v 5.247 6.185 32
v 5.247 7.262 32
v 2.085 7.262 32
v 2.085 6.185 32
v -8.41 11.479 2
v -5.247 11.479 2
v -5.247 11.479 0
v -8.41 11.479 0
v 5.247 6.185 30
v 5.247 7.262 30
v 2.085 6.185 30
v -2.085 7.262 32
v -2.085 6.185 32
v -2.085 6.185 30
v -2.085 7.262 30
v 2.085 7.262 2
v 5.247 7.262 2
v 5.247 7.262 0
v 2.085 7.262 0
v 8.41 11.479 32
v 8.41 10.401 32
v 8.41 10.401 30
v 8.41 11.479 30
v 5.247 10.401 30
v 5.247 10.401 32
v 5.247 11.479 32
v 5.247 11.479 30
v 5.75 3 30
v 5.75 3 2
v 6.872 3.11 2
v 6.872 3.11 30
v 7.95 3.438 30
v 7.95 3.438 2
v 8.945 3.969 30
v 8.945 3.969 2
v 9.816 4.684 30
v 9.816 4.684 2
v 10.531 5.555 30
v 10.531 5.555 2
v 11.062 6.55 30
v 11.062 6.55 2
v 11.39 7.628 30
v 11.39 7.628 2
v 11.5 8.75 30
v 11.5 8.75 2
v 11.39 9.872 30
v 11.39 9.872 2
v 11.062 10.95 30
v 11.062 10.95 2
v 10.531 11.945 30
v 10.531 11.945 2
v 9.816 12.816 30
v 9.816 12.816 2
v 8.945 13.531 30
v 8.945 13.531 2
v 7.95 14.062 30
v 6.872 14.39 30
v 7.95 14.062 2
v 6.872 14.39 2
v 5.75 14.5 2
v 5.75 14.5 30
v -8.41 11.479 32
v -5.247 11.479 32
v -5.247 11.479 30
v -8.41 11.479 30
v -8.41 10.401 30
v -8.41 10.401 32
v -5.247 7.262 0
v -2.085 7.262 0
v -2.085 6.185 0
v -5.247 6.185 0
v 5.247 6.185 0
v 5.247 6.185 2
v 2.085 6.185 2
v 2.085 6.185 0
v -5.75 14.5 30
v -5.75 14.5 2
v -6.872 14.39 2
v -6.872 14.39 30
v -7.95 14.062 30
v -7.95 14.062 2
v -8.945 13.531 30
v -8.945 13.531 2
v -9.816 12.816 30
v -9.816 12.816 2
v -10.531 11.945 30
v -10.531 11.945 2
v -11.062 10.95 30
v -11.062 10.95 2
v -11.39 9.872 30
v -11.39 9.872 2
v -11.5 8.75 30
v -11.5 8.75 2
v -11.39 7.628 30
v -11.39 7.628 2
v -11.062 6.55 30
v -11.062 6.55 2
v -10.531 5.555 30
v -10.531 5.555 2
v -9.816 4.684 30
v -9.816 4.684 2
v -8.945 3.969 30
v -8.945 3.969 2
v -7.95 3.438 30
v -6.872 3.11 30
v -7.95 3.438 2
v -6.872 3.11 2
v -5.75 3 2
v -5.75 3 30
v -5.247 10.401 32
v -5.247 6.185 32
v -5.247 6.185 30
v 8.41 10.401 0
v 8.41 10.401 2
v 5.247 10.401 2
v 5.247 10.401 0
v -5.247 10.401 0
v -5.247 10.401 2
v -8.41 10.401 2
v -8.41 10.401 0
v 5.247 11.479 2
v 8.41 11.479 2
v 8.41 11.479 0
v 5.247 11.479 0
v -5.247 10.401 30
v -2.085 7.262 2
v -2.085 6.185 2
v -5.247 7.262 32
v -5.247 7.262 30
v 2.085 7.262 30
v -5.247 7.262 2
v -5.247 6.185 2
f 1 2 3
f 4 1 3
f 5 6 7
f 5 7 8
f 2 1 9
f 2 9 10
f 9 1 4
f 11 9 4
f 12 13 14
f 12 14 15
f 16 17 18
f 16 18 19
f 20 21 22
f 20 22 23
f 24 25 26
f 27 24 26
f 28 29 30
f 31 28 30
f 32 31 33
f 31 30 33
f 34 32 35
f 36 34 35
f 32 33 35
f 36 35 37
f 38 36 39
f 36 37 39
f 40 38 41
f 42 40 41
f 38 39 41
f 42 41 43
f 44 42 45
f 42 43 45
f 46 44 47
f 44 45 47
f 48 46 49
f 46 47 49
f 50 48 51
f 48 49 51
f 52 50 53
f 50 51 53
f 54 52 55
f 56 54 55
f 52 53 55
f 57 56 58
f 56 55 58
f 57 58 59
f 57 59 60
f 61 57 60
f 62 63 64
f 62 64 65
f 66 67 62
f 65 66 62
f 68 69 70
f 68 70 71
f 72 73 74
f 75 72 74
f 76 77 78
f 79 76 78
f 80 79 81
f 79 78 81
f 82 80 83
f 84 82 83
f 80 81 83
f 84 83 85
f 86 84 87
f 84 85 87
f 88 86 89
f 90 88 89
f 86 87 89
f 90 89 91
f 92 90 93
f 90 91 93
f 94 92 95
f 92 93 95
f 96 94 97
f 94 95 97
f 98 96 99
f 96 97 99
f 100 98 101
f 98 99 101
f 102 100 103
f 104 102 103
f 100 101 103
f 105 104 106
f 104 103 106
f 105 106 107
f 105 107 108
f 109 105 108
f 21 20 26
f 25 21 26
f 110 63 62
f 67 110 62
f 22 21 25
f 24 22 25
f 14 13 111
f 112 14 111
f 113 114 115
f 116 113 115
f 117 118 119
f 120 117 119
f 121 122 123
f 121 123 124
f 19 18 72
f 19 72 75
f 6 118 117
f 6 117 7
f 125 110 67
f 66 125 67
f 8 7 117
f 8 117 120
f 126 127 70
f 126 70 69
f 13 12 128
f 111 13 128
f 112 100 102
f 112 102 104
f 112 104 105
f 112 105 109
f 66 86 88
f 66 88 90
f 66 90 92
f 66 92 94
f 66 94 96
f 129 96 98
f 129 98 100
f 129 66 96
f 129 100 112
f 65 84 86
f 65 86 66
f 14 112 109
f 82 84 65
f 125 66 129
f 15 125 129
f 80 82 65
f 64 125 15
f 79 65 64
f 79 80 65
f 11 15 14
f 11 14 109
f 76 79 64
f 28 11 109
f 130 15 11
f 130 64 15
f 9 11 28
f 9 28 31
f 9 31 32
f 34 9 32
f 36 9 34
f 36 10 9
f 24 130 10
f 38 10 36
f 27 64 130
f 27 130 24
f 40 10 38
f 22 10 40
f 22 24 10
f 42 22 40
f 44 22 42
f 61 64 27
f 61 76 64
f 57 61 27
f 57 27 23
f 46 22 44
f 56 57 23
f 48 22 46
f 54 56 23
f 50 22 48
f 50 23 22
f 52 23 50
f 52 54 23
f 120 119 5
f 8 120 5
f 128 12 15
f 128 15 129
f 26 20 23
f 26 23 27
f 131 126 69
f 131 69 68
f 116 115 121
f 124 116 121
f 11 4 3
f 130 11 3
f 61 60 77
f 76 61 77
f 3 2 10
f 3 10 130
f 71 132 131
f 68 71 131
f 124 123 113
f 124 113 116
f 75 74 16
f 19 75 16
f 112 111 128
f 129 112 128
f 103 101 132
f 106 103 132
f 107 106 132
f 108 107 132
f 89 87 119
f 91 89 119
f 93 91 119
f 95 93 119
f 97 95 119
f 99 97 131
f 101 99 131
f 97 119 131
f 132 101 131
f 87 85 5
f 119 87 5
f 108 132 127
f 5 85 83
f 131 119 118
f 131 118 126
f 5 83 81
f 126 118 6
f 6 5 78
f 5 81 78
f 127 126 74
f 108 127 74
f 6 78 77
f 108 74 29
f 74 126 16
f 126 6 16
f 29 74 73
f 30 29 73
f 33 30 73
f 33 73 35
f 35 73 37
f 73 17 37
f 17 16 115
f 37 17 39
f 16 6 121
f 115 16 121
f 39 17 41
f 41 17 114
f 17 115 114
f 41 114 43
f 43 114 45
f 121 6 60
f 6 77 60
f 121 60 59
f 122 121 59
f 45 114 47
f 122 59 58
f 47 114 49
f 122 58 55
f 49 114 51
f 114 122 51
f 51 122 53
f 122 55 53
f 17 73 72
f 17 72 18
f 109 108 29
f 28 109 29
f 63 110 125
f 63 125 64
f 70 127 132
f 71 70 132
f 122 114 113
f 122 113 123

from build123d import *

# Parameters (mm, degrees)
EXTRUDE1_START      = 2
EXTRUDE1_DEPTH      = 28
EXTRUDE2_DEPTH      = 2
EXTRUDE2_DEPTH_BACK = 30
SKETCH4_W           = 3.162406988
SKETCH4_H           = 1.077560899
SKETCH4_H_2         = 1.0775609


with BuildPart() as part:
    # Sketch1 → Extrude1 (new body)
    with BuildSketch(Plane.XY.offset(EXTRUDE1_START)):
        with BuildLine():
            Line((5.75, 14.5), (-5.75, 14.5))
            ThreePointArc((-5.75, 14.5), (-11.5, 8.75), (-5.75, 3))
            Line((-5.75, 3), (5.75, 3))
            ThreePointArc((5.75, 3), (11.5, 8.75), (5.75, 14.5))
        make_face()
    extrude(amount=EXTRUDE1_DEPTH)

    # Sketch4 → Extrude2 (add, two sides: drawn at the far end of the back side and taken through both)
    with BuildSketch(Plane(origin=(0, 0, 2), x_dir=(-1, 0, 0), z_dir=(0, 0, -1)).offset(-EXTRUDE2_DEPTH_BACK)):
        with Locations((-6.82845657, 10.940259655)):
            Rectangle(SKETCH4_W, SKETCH4_H)
        with Locations((-3.666049582, 6.723717004)):
            Rectangle(SKETCH4_W, SKETCH4_H_2)
        with Locations((3.666049582, 6.723717004)):
            Rectangle(SKETCH4_W, SKETCH4_H_2)
        with Locations((6.82845657, 10.940259655)):
            Rectangle(SKETCH4_W, SKETCH4_H)
    extrude(amount=EXTRUDE2_DEPTH + EXTRUDE2_DEPTH_BACK)


solid = part.part
